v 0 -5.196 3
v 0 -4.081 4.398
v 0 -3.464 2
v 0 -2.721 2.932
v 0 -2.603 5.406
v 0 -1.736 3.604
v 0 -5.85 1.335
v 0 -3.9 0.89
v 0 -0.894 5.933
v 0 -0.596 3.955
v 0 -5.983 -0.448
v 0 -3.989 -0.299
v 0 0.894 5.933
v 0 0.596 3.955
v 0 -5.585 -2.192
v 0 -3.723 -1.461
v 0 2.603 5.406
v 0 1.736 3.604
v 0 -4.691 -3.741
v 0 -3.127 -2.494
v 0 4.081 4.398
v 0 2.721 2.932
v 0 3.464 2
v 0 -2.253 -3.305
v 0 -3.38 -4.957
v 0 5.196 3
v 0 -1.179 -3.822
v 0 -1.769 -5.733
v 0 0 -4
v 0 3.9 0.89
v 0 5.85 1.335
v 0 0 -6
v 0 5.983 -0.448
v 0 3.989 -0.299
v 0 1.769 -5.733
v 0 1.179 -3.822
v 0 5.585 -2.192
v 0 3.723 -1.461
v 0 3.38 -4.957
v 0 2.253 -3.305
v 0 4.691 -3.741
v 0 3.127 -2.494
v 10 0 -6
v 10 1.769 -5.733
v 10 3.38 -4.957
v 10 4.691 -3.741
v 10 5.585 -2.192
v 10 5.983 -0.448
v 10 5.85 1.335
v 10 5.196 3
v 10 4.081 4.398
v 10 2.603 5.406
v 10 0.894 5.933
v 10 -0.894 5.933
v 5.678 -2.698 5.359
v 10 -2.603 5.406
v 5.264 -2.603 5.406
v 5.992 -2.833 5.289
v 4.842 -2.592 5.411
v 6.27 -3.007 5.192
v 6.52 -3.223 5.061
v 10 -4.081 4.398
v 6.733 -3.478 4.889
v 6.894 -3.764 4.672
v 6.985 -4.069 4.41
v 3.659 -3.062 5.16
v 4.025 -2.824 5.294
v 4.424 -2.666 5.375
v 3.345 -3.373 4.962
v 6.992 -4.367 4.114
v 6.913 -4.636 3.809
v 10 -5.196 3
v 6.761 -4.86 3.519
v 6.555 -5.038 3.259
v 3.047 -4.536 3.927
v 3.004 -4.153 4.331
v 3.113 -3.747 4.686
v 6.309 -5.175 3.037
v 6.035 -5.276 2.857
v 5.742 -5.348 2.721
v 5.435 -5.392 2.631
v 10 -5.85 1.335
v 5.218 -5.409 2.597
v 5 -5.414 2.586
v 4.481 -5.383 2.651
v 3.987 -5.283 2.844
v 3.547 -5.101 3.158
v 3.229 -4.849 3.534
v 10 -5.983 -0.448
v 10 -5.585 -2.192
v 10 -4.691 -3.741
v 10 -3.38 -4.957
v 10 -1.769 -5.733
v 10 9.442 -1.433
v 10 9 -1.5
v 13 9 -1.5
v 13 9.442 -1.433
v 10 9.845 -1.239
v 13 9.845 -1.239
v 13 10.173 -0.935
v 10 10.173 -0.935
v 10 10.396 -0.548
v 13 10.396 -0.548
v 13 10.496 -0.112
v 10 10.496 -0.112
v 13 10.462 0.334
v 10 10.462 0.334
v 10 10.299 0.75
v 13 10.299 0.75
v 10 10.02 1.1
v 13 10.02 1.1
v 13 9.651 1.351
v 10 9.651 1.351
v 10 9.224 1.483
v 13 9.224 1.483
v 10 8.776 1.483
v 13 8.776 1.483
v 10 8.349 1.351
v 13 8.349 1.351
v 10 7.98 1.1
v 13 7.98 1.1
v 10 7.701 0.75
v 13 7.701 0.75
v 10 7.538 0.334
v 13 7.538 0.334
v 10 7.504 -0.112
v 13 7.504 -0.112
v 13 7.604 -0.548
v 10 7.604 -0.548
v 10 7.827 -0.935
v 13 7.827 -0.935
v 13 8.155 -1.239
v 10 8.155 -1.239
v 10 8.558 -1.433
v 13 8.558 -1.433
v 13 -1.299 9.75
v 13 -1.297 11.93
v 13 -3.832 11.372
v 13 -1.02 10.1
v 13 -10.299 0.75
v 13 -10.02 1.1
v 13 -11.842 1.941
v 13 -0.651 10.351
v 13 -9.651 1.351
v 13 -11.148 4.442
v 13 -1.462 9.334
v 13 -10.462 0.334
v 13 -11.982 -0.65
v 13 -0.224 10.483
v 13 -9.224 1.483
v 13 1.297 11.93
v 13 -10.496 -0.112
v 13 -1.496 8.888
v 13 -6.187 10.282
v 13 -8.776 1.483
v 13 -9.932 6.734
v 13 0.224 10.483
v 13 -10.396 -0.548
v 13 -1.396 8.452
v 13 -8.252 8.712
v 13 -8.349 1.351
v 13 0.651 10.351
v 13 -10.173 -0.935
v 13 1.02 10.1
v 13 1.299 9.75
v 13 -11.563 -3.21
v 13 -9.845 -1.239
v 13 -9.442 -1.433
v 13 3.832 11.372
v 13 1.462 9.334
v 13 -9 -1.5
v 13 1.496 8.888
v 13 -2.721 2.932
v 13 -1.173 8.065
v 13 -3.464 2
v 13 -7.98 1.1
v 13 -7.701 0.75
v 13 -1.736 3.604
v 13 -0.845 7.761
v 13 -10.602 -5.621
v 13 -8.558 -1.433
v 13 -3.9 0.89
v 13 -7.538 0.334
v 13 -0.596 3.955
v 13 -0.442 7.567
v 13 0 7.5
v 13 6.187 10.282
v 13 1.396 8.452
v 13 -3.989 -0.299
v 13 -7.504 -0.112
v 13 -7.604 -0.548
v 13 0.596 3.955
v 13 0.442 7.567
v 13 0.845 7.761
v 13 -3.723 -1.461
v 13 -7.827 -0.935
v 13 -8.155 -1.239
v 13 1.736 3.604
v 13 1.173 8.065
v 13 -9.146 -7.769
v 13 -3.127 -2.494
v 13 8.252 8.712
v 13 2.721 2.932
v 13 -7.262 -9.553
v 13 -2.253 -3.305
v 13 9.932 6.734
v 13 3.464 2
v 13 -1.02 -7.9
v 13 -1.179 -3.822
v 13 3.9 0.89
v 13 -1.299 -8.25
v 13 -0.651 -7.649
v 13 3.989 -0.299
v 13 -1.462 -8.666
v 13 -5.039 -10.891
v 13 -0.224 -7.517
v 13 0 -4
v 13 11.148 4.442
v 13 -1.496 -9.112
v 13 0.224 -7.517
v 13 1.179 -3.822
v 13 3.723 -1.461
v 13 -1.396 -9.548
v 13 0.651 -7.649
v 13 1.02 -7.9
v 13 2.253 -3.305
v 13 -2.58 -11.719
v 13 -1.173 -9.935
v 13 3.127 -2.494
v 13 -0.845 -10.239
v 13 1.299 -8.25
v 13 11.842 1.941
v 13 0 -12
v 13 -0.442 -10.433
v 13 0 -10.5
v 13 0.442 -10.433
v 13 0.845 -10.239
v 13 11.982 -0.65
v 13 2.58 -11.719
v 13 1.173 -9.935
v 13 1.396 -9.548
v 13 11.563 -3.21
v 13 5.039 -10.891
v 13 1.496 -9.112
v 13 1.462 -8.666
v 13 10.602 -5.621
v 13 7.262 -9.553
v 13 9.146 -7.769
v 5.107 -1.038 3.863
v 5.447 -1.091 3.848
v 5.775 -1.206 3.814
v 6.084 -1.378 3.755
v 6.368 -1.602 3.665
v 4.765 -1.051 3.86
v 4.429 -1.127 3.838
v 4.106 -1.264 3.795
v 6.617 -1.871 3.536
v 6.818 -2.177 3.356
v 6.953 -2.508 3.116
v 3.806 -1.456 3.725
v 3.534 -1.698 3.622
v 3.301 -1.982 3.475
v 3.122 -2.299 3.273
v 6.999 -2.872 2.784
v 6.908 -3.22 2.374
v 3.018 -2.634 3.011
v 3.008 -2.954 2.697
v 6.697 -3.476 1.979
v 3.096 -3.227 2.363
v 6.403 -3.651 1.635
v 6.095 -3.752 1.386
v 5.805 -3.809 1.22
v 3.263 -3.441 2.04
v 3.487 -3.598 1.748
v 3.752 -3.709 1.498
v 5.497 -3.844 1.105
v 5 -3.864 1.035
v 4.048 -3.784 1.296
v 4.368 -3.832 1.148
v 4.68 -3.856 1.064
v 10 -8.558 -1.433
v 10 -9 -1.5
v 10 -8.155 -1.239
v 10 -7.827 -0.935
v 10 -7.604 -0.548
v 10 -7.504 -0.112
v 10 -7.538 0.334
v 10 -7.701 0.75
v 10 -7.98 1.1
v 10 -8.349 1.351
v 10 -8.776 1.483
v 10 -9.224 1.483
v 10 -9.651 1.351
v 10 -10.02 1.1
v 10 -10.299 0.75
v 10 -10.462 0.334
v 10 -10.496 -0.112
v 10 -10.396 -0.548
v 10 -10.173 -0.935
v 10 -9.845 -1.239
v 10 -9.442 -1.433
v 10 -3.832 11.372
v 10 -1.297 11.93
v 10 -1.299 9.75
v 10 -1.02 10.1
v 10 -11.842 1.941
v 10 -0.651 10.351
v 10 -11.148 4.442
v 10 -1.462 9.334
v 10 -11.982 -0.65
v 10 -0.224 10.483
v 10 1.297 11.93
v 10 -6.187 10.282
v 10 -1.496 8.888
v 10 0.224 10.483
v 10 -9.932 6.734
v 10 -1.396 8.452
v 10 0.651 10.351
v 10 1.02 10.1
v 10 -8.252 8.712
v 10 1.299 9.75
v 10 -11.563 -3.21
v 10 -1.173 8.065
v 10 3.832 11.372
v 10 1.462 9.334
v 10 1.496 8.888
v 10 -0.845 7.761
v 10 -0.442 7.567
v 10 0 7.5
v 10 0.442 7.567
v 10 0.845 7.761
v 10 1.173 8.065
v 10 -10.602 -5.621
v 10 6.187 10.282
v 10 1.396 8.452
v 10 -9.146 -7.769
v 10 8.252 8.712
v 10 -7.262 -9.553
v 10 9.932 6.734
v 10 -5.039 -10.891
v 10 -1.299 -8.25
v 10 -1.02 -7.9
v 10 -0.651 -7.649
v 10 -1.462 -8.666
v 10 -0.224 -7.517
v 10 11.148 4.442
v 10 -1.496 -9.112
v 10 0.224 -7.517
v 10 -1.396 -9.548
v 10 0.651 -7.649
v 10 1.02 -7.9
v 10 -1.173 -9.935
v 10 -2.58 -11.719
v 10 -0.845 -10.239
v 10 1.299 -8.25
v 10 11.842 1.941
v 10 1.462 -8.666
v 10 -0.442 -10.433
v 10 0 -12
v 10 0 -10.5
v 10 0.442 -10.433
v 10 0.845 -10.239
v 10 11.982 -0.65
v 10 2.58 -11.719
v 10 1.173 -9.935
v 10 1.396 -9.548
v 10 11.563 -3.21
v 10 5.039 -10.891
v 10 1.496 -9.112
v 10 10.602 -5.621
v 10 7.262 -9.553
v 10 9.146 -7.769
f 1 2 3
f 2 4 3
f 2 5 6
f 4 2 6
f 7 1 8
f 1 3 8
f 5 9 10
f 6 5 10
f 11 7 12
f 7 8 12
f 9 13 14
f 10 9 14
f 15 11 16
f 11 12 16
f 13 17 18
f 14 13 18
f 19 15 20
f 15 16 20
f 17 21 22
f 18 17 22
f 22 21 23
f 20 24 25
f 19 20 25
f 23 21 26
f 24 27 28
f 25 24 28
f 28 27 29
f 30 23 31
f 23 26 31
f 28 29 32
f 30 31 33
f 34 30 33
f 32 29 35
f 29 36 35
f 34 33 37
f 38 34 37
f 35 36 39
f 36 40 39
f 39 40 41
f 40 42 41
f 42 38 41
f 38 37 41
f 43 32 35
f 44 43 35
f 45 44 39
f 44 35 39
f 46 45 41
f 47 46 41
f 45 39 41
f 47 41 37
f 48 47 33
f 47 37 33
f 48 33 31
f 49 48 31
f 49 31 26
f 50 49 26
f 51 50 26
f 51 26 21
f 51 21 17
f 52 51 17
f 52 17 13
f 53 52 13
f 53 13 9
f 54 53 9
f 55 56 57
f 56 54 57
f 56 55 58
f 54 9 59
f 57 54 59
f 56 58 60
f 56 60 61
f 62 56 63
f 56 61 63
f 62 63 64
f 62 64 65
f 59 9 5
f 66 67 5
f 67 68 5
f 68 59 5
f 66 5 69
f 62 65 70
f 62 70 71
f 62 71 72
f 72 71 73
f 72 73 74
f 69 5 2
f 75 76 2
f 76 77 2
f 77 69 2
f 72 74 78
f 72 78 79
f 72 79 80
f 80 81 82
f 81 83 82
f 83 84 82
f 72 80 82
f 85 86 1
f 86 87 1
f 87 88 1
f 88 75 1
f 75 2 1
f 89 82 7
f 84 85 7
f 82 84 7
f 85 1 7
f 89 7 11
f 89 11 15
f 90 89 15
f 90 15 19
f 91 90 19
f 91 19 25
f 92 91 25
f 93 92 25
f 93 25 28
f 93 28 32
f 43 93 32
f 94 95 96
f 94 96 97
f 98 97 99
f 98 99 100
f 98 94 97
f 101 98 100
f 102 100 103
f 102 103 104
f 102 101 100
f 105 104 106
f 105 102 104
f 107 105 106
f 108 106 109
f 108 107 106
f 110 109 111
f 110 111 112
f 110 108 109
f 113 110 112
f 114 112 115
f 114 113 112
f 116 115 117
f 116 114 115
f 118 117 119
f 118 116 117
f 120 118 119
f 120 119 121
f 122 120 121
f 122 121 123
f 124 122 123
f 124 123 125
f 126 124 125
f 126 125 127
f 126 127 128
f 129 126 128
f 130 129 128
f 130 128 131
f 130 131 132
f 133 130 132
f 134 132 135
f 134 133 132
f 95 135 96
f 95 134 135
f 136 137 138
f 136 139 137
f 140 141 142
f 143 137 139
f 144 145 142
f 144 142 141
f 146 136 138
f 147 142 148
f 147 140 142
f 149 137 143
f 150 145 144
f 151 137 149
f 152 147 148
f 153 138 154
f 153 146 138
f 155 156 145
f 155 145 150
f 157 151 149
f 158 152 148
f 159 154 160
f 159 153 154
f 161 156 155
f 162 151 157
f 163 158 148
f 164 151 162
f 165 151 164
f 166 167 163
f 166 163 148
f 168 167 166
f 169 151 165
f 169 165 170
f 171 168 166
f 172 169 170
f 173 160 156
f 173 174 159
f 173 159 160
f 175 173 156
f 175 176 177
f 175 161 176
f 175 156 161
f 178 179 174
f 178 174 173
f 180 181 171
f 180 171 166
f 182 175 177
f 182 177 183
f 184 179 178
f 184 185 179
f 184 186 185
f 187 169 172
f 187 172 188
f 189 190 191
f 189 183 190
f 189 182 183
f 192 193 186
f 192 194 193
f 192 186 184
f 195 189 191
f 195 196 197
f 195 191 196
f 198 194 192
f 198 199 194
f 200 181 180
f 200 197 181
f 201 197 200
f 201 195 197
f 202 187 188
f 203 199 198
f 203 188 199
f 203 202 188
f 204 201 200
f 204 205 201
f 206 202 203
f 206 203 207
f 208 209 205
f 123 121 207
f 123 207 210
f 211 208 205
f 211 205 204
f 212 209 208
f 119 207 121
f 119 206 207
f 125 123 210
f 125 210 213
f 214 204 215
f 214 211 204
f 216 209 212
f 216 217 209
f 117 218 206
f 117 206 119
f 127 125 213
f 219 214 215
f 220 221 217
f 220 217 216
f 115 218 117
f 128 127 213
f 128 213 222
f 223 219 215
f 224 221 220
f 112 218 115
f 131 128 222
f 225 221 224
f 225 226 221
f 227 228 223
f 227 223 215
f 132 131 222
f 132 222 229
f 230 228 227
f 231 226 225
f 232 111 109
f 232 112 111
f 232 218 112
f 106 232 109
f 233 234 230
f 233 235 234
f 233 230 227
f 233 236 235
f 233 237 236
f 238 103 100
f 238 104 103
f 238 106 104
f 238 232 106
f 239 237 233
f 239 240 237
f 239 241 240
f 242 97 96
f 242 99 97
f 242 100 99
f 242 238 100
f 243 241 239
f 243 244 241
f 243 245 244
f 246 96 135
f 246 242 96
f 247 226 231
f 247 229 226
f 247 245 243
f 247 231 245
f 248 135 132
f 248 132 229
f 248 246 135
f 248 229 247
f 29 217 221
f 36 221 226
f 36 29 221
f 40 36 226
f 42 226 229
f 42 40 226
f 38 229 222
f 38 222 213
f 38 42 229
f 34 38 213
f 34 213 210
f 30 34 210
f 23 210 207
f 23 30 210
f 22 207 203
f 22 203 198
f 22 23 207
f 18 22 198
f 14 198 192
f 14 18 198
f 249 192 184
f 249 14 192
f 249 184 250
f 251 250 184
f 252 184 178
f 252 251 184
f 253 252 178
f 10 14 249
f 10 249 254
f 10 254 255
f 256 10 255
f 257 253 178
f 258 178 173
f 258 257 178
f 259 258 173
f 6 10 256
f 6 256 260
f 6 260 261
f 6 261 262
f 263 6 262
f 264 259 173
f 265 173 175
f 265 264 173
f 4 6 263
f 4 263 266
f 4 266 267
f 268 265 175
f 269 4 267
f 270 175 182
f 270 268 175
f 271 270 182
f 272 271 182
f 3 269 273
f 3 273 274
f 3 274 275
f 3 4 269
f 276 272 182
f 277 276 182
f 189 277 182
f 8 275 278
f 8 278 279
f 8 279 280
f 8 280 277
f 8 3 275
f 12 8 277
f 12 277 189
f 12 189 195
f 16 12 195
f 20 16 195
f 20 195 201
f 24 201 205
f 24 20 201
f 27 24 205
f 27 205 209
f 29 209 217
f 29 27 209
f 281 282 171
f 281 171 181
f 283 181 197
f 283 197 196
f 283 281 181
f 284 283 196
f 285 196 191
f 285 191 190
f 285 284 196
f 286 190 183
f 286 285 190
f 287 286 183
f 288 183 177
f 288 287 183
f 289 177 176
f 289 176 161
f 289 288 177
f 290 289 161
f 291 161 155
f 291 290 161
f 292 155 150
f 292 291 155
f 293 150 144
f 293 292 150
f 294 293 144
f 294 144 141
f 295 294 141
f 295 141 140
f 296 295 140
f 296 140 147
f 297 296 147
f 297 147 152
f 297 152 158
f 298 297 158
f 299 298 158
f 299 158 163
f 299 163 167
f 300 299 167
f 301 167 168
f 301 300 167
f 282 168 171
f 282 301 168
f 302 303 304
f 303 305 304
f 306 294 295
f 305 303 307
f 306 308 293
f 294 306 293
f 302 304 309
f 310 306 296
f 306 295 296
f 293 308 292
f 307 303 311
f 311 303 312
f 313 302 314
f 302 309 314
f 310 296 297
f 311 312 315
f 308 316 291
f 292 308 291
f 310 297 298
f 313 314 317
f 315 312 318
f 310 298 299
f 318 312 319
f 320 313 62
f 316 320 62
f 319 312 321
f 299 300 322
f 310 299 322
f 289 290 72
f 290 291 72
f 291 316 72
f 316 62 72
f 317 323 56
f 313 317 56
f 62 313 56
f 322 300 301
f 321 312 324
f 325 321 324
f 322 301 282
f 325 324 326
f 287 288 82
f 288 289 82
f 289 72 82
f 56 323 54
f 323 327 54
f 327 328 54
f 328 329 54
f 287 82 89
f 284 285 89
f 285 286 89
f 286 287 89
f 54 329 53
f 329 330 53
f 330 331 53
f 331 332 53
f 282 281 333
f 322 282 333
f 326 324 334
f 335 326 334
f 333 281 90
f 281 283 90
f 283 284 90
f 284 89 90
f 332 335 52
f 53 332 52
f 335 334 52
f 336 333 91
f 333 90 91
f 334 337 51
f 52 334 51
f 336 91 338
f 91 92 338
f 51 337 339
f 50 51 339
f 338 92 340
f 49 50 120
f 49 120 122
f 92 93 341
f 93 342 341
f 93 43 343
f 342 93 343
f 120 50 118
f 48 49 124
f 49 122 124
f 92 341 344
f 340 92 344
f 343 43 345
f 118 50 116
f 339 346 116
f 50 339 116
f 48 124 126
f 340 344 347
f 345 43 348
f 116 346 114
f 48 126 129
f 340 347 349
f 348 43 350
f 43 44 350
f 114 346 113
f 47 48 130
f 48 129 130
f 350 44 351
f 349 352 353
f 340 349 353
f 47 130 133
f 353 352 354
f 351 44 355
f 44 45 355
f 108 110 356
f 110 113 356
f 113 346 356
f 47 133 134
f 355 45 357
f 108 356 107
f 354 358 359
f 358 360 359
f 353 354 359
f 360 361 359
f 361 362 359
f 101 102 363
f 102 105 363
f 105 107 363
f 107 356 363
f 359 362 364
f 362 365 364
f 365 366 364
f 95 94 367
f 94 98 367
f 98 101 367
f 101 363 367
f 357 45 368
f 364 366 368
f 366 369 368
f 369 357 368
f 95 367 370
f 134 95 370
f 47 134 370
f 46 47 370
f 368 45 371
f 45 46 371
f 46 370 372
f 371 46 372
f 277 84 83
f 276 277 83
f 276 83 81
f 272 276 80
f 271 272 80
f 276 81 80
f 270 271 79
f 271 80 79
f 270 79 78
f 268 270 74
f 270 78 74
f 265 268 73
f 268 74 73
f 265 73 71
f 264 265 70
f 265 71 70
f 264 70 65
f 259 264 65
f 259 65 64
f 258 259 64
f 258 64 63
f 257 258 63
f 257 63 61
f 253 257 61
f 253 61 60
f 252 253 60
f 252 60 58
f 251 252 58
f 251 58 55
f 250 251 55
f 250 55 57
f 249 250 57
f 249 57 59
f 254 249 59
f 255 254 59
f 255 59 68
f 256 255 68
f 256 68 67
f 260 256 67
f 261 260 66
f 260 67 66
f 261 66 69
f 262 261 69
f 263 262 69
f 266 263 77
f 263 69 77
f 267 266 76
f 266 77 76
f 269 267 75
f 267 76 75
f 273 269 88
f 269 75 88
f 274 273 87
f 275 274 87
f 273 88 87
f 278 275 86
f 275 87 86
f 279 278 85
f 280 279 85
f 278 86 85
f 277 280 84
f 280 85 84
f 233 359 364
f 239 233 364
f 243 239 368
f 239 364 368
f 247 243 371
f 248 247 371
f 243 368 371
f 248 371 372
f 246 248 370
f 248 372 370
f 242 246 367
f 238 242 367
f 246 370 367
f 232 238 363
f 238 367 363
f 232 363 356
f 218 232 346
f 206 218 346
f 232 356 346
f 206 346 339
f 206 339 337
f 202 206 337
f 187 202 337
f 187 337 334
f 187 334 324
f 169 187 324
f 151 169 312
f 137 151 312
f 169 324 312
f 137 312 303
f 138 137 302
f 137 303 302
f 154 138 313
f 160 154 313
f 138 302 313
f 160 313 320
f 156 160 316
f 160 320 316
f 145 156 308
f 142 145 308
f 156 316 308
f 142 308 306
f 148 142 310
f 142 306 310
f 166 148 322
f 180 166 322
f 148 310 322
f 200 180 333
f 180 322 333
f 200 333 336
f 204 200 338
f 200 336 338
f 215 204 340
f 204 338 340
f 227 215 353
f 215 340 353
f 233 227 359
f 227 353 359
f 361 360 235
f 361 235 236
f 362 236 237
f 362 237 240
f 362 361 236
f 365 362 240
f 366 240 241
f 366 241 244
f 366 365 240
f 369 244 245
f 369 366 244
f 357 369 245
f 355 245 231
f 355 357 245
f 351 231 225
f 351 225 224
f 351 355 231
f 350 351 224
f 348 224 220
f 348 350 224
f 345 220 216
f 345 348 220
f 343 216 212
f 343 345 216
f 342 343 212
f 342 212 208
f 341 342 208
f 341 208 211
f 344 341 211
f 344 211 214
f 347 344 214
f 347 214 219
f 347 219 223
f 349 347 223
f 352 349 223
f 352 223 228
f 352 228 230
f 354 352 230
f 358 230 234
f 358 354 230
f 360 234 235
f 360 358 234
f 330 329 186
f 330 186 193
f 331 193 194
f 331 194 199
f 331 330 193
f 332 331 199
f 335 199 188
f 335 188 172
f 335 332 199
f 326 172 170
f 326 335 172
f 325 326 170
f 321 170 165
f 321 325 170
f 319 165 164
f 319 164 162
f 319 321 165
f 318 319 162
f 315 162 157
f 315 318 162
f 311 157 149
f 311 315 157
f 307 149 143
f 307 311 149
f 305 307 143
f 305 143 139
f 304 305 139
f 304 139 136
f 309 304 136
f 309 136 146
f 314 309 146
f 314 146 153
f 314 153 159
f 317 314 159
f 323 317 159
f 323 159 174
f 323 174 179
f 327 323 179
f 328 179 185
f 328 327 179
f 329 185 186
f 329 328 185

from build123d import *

# Parameters (mm, degrees)
SKETCH1_R           = 6
SKETCH1_R_2         = 4
BOSS_EXTRUDE1_DEPTH = 10
SKETCH2_R           = 12
SKETCH2_R_2         = 1.5
SKETCH2_R_3         = 4
BOSS_EXTRUDE3_DEPTH = 3
SKETCH3_R           = 2
CUT_EXTRUDE1_DEPTH  = 3


with BuildPart() as part:
    # Sketch1 → Boss-Extrude1 (new body)
    with BuildSketch(Plane(origin=(0, 0, 0), x_dir=(0, 0, -1), z_dir=(1, 0, 0))):
        Circle(SKETCH1_R)
        Circle(SKETCH1_R_2, mode=Mode.SUBTRACT)
    extrude(amount=BOSS_EXTRUDE1_DEPTH)

    # Sketch2 → Boss-Extrude3 (add)
    with BuildSketch(Plane(origin=(10, 0, 0), x_dir=(0, 0, -1), z_dir=(1, 0, 0))):
        Circle(SKETCH2_R)
        with Locations((0, 9)):
            Circle(SKETCH2_R_2, mode=Mode.SUBTRACT)
        with Locations((-9, 0)):
            Circle(SKETCH2_R_2, mode=Mode.SUBTRACT)
        with Locations((0, -9)):
            Circle(SKETCH2_R_2, mode=Mode.SUBTRACT)
        with Locations((9, 0)):
            Circle(SKETCH2_R_2, mode=Mode.SUBTRACT)
        Circle(SKETCH2_R_3, mode=Mode.SUBTRACT)
    extrude(amount=BOSS_EXTRUDE3_DEPTH)

    # Sketch3 → Cut-Extrude1 (cut)
    with BuildSketch(Plane(origin=(0, -4.242640687, 4.242640687), x_dir=(-1, 0, 0), z_dir=(0, -0.7071067811865488, 0.7071067811865464))):
        with Locations(Location((-5, 0, 0), (0, 0, 90))):
            Circle(SKETCH3_R)
    extrude(amount=-CUT_EXTRUDE1_DEPTH, mode=Mode.SUBTRACT)


solid = part.part
